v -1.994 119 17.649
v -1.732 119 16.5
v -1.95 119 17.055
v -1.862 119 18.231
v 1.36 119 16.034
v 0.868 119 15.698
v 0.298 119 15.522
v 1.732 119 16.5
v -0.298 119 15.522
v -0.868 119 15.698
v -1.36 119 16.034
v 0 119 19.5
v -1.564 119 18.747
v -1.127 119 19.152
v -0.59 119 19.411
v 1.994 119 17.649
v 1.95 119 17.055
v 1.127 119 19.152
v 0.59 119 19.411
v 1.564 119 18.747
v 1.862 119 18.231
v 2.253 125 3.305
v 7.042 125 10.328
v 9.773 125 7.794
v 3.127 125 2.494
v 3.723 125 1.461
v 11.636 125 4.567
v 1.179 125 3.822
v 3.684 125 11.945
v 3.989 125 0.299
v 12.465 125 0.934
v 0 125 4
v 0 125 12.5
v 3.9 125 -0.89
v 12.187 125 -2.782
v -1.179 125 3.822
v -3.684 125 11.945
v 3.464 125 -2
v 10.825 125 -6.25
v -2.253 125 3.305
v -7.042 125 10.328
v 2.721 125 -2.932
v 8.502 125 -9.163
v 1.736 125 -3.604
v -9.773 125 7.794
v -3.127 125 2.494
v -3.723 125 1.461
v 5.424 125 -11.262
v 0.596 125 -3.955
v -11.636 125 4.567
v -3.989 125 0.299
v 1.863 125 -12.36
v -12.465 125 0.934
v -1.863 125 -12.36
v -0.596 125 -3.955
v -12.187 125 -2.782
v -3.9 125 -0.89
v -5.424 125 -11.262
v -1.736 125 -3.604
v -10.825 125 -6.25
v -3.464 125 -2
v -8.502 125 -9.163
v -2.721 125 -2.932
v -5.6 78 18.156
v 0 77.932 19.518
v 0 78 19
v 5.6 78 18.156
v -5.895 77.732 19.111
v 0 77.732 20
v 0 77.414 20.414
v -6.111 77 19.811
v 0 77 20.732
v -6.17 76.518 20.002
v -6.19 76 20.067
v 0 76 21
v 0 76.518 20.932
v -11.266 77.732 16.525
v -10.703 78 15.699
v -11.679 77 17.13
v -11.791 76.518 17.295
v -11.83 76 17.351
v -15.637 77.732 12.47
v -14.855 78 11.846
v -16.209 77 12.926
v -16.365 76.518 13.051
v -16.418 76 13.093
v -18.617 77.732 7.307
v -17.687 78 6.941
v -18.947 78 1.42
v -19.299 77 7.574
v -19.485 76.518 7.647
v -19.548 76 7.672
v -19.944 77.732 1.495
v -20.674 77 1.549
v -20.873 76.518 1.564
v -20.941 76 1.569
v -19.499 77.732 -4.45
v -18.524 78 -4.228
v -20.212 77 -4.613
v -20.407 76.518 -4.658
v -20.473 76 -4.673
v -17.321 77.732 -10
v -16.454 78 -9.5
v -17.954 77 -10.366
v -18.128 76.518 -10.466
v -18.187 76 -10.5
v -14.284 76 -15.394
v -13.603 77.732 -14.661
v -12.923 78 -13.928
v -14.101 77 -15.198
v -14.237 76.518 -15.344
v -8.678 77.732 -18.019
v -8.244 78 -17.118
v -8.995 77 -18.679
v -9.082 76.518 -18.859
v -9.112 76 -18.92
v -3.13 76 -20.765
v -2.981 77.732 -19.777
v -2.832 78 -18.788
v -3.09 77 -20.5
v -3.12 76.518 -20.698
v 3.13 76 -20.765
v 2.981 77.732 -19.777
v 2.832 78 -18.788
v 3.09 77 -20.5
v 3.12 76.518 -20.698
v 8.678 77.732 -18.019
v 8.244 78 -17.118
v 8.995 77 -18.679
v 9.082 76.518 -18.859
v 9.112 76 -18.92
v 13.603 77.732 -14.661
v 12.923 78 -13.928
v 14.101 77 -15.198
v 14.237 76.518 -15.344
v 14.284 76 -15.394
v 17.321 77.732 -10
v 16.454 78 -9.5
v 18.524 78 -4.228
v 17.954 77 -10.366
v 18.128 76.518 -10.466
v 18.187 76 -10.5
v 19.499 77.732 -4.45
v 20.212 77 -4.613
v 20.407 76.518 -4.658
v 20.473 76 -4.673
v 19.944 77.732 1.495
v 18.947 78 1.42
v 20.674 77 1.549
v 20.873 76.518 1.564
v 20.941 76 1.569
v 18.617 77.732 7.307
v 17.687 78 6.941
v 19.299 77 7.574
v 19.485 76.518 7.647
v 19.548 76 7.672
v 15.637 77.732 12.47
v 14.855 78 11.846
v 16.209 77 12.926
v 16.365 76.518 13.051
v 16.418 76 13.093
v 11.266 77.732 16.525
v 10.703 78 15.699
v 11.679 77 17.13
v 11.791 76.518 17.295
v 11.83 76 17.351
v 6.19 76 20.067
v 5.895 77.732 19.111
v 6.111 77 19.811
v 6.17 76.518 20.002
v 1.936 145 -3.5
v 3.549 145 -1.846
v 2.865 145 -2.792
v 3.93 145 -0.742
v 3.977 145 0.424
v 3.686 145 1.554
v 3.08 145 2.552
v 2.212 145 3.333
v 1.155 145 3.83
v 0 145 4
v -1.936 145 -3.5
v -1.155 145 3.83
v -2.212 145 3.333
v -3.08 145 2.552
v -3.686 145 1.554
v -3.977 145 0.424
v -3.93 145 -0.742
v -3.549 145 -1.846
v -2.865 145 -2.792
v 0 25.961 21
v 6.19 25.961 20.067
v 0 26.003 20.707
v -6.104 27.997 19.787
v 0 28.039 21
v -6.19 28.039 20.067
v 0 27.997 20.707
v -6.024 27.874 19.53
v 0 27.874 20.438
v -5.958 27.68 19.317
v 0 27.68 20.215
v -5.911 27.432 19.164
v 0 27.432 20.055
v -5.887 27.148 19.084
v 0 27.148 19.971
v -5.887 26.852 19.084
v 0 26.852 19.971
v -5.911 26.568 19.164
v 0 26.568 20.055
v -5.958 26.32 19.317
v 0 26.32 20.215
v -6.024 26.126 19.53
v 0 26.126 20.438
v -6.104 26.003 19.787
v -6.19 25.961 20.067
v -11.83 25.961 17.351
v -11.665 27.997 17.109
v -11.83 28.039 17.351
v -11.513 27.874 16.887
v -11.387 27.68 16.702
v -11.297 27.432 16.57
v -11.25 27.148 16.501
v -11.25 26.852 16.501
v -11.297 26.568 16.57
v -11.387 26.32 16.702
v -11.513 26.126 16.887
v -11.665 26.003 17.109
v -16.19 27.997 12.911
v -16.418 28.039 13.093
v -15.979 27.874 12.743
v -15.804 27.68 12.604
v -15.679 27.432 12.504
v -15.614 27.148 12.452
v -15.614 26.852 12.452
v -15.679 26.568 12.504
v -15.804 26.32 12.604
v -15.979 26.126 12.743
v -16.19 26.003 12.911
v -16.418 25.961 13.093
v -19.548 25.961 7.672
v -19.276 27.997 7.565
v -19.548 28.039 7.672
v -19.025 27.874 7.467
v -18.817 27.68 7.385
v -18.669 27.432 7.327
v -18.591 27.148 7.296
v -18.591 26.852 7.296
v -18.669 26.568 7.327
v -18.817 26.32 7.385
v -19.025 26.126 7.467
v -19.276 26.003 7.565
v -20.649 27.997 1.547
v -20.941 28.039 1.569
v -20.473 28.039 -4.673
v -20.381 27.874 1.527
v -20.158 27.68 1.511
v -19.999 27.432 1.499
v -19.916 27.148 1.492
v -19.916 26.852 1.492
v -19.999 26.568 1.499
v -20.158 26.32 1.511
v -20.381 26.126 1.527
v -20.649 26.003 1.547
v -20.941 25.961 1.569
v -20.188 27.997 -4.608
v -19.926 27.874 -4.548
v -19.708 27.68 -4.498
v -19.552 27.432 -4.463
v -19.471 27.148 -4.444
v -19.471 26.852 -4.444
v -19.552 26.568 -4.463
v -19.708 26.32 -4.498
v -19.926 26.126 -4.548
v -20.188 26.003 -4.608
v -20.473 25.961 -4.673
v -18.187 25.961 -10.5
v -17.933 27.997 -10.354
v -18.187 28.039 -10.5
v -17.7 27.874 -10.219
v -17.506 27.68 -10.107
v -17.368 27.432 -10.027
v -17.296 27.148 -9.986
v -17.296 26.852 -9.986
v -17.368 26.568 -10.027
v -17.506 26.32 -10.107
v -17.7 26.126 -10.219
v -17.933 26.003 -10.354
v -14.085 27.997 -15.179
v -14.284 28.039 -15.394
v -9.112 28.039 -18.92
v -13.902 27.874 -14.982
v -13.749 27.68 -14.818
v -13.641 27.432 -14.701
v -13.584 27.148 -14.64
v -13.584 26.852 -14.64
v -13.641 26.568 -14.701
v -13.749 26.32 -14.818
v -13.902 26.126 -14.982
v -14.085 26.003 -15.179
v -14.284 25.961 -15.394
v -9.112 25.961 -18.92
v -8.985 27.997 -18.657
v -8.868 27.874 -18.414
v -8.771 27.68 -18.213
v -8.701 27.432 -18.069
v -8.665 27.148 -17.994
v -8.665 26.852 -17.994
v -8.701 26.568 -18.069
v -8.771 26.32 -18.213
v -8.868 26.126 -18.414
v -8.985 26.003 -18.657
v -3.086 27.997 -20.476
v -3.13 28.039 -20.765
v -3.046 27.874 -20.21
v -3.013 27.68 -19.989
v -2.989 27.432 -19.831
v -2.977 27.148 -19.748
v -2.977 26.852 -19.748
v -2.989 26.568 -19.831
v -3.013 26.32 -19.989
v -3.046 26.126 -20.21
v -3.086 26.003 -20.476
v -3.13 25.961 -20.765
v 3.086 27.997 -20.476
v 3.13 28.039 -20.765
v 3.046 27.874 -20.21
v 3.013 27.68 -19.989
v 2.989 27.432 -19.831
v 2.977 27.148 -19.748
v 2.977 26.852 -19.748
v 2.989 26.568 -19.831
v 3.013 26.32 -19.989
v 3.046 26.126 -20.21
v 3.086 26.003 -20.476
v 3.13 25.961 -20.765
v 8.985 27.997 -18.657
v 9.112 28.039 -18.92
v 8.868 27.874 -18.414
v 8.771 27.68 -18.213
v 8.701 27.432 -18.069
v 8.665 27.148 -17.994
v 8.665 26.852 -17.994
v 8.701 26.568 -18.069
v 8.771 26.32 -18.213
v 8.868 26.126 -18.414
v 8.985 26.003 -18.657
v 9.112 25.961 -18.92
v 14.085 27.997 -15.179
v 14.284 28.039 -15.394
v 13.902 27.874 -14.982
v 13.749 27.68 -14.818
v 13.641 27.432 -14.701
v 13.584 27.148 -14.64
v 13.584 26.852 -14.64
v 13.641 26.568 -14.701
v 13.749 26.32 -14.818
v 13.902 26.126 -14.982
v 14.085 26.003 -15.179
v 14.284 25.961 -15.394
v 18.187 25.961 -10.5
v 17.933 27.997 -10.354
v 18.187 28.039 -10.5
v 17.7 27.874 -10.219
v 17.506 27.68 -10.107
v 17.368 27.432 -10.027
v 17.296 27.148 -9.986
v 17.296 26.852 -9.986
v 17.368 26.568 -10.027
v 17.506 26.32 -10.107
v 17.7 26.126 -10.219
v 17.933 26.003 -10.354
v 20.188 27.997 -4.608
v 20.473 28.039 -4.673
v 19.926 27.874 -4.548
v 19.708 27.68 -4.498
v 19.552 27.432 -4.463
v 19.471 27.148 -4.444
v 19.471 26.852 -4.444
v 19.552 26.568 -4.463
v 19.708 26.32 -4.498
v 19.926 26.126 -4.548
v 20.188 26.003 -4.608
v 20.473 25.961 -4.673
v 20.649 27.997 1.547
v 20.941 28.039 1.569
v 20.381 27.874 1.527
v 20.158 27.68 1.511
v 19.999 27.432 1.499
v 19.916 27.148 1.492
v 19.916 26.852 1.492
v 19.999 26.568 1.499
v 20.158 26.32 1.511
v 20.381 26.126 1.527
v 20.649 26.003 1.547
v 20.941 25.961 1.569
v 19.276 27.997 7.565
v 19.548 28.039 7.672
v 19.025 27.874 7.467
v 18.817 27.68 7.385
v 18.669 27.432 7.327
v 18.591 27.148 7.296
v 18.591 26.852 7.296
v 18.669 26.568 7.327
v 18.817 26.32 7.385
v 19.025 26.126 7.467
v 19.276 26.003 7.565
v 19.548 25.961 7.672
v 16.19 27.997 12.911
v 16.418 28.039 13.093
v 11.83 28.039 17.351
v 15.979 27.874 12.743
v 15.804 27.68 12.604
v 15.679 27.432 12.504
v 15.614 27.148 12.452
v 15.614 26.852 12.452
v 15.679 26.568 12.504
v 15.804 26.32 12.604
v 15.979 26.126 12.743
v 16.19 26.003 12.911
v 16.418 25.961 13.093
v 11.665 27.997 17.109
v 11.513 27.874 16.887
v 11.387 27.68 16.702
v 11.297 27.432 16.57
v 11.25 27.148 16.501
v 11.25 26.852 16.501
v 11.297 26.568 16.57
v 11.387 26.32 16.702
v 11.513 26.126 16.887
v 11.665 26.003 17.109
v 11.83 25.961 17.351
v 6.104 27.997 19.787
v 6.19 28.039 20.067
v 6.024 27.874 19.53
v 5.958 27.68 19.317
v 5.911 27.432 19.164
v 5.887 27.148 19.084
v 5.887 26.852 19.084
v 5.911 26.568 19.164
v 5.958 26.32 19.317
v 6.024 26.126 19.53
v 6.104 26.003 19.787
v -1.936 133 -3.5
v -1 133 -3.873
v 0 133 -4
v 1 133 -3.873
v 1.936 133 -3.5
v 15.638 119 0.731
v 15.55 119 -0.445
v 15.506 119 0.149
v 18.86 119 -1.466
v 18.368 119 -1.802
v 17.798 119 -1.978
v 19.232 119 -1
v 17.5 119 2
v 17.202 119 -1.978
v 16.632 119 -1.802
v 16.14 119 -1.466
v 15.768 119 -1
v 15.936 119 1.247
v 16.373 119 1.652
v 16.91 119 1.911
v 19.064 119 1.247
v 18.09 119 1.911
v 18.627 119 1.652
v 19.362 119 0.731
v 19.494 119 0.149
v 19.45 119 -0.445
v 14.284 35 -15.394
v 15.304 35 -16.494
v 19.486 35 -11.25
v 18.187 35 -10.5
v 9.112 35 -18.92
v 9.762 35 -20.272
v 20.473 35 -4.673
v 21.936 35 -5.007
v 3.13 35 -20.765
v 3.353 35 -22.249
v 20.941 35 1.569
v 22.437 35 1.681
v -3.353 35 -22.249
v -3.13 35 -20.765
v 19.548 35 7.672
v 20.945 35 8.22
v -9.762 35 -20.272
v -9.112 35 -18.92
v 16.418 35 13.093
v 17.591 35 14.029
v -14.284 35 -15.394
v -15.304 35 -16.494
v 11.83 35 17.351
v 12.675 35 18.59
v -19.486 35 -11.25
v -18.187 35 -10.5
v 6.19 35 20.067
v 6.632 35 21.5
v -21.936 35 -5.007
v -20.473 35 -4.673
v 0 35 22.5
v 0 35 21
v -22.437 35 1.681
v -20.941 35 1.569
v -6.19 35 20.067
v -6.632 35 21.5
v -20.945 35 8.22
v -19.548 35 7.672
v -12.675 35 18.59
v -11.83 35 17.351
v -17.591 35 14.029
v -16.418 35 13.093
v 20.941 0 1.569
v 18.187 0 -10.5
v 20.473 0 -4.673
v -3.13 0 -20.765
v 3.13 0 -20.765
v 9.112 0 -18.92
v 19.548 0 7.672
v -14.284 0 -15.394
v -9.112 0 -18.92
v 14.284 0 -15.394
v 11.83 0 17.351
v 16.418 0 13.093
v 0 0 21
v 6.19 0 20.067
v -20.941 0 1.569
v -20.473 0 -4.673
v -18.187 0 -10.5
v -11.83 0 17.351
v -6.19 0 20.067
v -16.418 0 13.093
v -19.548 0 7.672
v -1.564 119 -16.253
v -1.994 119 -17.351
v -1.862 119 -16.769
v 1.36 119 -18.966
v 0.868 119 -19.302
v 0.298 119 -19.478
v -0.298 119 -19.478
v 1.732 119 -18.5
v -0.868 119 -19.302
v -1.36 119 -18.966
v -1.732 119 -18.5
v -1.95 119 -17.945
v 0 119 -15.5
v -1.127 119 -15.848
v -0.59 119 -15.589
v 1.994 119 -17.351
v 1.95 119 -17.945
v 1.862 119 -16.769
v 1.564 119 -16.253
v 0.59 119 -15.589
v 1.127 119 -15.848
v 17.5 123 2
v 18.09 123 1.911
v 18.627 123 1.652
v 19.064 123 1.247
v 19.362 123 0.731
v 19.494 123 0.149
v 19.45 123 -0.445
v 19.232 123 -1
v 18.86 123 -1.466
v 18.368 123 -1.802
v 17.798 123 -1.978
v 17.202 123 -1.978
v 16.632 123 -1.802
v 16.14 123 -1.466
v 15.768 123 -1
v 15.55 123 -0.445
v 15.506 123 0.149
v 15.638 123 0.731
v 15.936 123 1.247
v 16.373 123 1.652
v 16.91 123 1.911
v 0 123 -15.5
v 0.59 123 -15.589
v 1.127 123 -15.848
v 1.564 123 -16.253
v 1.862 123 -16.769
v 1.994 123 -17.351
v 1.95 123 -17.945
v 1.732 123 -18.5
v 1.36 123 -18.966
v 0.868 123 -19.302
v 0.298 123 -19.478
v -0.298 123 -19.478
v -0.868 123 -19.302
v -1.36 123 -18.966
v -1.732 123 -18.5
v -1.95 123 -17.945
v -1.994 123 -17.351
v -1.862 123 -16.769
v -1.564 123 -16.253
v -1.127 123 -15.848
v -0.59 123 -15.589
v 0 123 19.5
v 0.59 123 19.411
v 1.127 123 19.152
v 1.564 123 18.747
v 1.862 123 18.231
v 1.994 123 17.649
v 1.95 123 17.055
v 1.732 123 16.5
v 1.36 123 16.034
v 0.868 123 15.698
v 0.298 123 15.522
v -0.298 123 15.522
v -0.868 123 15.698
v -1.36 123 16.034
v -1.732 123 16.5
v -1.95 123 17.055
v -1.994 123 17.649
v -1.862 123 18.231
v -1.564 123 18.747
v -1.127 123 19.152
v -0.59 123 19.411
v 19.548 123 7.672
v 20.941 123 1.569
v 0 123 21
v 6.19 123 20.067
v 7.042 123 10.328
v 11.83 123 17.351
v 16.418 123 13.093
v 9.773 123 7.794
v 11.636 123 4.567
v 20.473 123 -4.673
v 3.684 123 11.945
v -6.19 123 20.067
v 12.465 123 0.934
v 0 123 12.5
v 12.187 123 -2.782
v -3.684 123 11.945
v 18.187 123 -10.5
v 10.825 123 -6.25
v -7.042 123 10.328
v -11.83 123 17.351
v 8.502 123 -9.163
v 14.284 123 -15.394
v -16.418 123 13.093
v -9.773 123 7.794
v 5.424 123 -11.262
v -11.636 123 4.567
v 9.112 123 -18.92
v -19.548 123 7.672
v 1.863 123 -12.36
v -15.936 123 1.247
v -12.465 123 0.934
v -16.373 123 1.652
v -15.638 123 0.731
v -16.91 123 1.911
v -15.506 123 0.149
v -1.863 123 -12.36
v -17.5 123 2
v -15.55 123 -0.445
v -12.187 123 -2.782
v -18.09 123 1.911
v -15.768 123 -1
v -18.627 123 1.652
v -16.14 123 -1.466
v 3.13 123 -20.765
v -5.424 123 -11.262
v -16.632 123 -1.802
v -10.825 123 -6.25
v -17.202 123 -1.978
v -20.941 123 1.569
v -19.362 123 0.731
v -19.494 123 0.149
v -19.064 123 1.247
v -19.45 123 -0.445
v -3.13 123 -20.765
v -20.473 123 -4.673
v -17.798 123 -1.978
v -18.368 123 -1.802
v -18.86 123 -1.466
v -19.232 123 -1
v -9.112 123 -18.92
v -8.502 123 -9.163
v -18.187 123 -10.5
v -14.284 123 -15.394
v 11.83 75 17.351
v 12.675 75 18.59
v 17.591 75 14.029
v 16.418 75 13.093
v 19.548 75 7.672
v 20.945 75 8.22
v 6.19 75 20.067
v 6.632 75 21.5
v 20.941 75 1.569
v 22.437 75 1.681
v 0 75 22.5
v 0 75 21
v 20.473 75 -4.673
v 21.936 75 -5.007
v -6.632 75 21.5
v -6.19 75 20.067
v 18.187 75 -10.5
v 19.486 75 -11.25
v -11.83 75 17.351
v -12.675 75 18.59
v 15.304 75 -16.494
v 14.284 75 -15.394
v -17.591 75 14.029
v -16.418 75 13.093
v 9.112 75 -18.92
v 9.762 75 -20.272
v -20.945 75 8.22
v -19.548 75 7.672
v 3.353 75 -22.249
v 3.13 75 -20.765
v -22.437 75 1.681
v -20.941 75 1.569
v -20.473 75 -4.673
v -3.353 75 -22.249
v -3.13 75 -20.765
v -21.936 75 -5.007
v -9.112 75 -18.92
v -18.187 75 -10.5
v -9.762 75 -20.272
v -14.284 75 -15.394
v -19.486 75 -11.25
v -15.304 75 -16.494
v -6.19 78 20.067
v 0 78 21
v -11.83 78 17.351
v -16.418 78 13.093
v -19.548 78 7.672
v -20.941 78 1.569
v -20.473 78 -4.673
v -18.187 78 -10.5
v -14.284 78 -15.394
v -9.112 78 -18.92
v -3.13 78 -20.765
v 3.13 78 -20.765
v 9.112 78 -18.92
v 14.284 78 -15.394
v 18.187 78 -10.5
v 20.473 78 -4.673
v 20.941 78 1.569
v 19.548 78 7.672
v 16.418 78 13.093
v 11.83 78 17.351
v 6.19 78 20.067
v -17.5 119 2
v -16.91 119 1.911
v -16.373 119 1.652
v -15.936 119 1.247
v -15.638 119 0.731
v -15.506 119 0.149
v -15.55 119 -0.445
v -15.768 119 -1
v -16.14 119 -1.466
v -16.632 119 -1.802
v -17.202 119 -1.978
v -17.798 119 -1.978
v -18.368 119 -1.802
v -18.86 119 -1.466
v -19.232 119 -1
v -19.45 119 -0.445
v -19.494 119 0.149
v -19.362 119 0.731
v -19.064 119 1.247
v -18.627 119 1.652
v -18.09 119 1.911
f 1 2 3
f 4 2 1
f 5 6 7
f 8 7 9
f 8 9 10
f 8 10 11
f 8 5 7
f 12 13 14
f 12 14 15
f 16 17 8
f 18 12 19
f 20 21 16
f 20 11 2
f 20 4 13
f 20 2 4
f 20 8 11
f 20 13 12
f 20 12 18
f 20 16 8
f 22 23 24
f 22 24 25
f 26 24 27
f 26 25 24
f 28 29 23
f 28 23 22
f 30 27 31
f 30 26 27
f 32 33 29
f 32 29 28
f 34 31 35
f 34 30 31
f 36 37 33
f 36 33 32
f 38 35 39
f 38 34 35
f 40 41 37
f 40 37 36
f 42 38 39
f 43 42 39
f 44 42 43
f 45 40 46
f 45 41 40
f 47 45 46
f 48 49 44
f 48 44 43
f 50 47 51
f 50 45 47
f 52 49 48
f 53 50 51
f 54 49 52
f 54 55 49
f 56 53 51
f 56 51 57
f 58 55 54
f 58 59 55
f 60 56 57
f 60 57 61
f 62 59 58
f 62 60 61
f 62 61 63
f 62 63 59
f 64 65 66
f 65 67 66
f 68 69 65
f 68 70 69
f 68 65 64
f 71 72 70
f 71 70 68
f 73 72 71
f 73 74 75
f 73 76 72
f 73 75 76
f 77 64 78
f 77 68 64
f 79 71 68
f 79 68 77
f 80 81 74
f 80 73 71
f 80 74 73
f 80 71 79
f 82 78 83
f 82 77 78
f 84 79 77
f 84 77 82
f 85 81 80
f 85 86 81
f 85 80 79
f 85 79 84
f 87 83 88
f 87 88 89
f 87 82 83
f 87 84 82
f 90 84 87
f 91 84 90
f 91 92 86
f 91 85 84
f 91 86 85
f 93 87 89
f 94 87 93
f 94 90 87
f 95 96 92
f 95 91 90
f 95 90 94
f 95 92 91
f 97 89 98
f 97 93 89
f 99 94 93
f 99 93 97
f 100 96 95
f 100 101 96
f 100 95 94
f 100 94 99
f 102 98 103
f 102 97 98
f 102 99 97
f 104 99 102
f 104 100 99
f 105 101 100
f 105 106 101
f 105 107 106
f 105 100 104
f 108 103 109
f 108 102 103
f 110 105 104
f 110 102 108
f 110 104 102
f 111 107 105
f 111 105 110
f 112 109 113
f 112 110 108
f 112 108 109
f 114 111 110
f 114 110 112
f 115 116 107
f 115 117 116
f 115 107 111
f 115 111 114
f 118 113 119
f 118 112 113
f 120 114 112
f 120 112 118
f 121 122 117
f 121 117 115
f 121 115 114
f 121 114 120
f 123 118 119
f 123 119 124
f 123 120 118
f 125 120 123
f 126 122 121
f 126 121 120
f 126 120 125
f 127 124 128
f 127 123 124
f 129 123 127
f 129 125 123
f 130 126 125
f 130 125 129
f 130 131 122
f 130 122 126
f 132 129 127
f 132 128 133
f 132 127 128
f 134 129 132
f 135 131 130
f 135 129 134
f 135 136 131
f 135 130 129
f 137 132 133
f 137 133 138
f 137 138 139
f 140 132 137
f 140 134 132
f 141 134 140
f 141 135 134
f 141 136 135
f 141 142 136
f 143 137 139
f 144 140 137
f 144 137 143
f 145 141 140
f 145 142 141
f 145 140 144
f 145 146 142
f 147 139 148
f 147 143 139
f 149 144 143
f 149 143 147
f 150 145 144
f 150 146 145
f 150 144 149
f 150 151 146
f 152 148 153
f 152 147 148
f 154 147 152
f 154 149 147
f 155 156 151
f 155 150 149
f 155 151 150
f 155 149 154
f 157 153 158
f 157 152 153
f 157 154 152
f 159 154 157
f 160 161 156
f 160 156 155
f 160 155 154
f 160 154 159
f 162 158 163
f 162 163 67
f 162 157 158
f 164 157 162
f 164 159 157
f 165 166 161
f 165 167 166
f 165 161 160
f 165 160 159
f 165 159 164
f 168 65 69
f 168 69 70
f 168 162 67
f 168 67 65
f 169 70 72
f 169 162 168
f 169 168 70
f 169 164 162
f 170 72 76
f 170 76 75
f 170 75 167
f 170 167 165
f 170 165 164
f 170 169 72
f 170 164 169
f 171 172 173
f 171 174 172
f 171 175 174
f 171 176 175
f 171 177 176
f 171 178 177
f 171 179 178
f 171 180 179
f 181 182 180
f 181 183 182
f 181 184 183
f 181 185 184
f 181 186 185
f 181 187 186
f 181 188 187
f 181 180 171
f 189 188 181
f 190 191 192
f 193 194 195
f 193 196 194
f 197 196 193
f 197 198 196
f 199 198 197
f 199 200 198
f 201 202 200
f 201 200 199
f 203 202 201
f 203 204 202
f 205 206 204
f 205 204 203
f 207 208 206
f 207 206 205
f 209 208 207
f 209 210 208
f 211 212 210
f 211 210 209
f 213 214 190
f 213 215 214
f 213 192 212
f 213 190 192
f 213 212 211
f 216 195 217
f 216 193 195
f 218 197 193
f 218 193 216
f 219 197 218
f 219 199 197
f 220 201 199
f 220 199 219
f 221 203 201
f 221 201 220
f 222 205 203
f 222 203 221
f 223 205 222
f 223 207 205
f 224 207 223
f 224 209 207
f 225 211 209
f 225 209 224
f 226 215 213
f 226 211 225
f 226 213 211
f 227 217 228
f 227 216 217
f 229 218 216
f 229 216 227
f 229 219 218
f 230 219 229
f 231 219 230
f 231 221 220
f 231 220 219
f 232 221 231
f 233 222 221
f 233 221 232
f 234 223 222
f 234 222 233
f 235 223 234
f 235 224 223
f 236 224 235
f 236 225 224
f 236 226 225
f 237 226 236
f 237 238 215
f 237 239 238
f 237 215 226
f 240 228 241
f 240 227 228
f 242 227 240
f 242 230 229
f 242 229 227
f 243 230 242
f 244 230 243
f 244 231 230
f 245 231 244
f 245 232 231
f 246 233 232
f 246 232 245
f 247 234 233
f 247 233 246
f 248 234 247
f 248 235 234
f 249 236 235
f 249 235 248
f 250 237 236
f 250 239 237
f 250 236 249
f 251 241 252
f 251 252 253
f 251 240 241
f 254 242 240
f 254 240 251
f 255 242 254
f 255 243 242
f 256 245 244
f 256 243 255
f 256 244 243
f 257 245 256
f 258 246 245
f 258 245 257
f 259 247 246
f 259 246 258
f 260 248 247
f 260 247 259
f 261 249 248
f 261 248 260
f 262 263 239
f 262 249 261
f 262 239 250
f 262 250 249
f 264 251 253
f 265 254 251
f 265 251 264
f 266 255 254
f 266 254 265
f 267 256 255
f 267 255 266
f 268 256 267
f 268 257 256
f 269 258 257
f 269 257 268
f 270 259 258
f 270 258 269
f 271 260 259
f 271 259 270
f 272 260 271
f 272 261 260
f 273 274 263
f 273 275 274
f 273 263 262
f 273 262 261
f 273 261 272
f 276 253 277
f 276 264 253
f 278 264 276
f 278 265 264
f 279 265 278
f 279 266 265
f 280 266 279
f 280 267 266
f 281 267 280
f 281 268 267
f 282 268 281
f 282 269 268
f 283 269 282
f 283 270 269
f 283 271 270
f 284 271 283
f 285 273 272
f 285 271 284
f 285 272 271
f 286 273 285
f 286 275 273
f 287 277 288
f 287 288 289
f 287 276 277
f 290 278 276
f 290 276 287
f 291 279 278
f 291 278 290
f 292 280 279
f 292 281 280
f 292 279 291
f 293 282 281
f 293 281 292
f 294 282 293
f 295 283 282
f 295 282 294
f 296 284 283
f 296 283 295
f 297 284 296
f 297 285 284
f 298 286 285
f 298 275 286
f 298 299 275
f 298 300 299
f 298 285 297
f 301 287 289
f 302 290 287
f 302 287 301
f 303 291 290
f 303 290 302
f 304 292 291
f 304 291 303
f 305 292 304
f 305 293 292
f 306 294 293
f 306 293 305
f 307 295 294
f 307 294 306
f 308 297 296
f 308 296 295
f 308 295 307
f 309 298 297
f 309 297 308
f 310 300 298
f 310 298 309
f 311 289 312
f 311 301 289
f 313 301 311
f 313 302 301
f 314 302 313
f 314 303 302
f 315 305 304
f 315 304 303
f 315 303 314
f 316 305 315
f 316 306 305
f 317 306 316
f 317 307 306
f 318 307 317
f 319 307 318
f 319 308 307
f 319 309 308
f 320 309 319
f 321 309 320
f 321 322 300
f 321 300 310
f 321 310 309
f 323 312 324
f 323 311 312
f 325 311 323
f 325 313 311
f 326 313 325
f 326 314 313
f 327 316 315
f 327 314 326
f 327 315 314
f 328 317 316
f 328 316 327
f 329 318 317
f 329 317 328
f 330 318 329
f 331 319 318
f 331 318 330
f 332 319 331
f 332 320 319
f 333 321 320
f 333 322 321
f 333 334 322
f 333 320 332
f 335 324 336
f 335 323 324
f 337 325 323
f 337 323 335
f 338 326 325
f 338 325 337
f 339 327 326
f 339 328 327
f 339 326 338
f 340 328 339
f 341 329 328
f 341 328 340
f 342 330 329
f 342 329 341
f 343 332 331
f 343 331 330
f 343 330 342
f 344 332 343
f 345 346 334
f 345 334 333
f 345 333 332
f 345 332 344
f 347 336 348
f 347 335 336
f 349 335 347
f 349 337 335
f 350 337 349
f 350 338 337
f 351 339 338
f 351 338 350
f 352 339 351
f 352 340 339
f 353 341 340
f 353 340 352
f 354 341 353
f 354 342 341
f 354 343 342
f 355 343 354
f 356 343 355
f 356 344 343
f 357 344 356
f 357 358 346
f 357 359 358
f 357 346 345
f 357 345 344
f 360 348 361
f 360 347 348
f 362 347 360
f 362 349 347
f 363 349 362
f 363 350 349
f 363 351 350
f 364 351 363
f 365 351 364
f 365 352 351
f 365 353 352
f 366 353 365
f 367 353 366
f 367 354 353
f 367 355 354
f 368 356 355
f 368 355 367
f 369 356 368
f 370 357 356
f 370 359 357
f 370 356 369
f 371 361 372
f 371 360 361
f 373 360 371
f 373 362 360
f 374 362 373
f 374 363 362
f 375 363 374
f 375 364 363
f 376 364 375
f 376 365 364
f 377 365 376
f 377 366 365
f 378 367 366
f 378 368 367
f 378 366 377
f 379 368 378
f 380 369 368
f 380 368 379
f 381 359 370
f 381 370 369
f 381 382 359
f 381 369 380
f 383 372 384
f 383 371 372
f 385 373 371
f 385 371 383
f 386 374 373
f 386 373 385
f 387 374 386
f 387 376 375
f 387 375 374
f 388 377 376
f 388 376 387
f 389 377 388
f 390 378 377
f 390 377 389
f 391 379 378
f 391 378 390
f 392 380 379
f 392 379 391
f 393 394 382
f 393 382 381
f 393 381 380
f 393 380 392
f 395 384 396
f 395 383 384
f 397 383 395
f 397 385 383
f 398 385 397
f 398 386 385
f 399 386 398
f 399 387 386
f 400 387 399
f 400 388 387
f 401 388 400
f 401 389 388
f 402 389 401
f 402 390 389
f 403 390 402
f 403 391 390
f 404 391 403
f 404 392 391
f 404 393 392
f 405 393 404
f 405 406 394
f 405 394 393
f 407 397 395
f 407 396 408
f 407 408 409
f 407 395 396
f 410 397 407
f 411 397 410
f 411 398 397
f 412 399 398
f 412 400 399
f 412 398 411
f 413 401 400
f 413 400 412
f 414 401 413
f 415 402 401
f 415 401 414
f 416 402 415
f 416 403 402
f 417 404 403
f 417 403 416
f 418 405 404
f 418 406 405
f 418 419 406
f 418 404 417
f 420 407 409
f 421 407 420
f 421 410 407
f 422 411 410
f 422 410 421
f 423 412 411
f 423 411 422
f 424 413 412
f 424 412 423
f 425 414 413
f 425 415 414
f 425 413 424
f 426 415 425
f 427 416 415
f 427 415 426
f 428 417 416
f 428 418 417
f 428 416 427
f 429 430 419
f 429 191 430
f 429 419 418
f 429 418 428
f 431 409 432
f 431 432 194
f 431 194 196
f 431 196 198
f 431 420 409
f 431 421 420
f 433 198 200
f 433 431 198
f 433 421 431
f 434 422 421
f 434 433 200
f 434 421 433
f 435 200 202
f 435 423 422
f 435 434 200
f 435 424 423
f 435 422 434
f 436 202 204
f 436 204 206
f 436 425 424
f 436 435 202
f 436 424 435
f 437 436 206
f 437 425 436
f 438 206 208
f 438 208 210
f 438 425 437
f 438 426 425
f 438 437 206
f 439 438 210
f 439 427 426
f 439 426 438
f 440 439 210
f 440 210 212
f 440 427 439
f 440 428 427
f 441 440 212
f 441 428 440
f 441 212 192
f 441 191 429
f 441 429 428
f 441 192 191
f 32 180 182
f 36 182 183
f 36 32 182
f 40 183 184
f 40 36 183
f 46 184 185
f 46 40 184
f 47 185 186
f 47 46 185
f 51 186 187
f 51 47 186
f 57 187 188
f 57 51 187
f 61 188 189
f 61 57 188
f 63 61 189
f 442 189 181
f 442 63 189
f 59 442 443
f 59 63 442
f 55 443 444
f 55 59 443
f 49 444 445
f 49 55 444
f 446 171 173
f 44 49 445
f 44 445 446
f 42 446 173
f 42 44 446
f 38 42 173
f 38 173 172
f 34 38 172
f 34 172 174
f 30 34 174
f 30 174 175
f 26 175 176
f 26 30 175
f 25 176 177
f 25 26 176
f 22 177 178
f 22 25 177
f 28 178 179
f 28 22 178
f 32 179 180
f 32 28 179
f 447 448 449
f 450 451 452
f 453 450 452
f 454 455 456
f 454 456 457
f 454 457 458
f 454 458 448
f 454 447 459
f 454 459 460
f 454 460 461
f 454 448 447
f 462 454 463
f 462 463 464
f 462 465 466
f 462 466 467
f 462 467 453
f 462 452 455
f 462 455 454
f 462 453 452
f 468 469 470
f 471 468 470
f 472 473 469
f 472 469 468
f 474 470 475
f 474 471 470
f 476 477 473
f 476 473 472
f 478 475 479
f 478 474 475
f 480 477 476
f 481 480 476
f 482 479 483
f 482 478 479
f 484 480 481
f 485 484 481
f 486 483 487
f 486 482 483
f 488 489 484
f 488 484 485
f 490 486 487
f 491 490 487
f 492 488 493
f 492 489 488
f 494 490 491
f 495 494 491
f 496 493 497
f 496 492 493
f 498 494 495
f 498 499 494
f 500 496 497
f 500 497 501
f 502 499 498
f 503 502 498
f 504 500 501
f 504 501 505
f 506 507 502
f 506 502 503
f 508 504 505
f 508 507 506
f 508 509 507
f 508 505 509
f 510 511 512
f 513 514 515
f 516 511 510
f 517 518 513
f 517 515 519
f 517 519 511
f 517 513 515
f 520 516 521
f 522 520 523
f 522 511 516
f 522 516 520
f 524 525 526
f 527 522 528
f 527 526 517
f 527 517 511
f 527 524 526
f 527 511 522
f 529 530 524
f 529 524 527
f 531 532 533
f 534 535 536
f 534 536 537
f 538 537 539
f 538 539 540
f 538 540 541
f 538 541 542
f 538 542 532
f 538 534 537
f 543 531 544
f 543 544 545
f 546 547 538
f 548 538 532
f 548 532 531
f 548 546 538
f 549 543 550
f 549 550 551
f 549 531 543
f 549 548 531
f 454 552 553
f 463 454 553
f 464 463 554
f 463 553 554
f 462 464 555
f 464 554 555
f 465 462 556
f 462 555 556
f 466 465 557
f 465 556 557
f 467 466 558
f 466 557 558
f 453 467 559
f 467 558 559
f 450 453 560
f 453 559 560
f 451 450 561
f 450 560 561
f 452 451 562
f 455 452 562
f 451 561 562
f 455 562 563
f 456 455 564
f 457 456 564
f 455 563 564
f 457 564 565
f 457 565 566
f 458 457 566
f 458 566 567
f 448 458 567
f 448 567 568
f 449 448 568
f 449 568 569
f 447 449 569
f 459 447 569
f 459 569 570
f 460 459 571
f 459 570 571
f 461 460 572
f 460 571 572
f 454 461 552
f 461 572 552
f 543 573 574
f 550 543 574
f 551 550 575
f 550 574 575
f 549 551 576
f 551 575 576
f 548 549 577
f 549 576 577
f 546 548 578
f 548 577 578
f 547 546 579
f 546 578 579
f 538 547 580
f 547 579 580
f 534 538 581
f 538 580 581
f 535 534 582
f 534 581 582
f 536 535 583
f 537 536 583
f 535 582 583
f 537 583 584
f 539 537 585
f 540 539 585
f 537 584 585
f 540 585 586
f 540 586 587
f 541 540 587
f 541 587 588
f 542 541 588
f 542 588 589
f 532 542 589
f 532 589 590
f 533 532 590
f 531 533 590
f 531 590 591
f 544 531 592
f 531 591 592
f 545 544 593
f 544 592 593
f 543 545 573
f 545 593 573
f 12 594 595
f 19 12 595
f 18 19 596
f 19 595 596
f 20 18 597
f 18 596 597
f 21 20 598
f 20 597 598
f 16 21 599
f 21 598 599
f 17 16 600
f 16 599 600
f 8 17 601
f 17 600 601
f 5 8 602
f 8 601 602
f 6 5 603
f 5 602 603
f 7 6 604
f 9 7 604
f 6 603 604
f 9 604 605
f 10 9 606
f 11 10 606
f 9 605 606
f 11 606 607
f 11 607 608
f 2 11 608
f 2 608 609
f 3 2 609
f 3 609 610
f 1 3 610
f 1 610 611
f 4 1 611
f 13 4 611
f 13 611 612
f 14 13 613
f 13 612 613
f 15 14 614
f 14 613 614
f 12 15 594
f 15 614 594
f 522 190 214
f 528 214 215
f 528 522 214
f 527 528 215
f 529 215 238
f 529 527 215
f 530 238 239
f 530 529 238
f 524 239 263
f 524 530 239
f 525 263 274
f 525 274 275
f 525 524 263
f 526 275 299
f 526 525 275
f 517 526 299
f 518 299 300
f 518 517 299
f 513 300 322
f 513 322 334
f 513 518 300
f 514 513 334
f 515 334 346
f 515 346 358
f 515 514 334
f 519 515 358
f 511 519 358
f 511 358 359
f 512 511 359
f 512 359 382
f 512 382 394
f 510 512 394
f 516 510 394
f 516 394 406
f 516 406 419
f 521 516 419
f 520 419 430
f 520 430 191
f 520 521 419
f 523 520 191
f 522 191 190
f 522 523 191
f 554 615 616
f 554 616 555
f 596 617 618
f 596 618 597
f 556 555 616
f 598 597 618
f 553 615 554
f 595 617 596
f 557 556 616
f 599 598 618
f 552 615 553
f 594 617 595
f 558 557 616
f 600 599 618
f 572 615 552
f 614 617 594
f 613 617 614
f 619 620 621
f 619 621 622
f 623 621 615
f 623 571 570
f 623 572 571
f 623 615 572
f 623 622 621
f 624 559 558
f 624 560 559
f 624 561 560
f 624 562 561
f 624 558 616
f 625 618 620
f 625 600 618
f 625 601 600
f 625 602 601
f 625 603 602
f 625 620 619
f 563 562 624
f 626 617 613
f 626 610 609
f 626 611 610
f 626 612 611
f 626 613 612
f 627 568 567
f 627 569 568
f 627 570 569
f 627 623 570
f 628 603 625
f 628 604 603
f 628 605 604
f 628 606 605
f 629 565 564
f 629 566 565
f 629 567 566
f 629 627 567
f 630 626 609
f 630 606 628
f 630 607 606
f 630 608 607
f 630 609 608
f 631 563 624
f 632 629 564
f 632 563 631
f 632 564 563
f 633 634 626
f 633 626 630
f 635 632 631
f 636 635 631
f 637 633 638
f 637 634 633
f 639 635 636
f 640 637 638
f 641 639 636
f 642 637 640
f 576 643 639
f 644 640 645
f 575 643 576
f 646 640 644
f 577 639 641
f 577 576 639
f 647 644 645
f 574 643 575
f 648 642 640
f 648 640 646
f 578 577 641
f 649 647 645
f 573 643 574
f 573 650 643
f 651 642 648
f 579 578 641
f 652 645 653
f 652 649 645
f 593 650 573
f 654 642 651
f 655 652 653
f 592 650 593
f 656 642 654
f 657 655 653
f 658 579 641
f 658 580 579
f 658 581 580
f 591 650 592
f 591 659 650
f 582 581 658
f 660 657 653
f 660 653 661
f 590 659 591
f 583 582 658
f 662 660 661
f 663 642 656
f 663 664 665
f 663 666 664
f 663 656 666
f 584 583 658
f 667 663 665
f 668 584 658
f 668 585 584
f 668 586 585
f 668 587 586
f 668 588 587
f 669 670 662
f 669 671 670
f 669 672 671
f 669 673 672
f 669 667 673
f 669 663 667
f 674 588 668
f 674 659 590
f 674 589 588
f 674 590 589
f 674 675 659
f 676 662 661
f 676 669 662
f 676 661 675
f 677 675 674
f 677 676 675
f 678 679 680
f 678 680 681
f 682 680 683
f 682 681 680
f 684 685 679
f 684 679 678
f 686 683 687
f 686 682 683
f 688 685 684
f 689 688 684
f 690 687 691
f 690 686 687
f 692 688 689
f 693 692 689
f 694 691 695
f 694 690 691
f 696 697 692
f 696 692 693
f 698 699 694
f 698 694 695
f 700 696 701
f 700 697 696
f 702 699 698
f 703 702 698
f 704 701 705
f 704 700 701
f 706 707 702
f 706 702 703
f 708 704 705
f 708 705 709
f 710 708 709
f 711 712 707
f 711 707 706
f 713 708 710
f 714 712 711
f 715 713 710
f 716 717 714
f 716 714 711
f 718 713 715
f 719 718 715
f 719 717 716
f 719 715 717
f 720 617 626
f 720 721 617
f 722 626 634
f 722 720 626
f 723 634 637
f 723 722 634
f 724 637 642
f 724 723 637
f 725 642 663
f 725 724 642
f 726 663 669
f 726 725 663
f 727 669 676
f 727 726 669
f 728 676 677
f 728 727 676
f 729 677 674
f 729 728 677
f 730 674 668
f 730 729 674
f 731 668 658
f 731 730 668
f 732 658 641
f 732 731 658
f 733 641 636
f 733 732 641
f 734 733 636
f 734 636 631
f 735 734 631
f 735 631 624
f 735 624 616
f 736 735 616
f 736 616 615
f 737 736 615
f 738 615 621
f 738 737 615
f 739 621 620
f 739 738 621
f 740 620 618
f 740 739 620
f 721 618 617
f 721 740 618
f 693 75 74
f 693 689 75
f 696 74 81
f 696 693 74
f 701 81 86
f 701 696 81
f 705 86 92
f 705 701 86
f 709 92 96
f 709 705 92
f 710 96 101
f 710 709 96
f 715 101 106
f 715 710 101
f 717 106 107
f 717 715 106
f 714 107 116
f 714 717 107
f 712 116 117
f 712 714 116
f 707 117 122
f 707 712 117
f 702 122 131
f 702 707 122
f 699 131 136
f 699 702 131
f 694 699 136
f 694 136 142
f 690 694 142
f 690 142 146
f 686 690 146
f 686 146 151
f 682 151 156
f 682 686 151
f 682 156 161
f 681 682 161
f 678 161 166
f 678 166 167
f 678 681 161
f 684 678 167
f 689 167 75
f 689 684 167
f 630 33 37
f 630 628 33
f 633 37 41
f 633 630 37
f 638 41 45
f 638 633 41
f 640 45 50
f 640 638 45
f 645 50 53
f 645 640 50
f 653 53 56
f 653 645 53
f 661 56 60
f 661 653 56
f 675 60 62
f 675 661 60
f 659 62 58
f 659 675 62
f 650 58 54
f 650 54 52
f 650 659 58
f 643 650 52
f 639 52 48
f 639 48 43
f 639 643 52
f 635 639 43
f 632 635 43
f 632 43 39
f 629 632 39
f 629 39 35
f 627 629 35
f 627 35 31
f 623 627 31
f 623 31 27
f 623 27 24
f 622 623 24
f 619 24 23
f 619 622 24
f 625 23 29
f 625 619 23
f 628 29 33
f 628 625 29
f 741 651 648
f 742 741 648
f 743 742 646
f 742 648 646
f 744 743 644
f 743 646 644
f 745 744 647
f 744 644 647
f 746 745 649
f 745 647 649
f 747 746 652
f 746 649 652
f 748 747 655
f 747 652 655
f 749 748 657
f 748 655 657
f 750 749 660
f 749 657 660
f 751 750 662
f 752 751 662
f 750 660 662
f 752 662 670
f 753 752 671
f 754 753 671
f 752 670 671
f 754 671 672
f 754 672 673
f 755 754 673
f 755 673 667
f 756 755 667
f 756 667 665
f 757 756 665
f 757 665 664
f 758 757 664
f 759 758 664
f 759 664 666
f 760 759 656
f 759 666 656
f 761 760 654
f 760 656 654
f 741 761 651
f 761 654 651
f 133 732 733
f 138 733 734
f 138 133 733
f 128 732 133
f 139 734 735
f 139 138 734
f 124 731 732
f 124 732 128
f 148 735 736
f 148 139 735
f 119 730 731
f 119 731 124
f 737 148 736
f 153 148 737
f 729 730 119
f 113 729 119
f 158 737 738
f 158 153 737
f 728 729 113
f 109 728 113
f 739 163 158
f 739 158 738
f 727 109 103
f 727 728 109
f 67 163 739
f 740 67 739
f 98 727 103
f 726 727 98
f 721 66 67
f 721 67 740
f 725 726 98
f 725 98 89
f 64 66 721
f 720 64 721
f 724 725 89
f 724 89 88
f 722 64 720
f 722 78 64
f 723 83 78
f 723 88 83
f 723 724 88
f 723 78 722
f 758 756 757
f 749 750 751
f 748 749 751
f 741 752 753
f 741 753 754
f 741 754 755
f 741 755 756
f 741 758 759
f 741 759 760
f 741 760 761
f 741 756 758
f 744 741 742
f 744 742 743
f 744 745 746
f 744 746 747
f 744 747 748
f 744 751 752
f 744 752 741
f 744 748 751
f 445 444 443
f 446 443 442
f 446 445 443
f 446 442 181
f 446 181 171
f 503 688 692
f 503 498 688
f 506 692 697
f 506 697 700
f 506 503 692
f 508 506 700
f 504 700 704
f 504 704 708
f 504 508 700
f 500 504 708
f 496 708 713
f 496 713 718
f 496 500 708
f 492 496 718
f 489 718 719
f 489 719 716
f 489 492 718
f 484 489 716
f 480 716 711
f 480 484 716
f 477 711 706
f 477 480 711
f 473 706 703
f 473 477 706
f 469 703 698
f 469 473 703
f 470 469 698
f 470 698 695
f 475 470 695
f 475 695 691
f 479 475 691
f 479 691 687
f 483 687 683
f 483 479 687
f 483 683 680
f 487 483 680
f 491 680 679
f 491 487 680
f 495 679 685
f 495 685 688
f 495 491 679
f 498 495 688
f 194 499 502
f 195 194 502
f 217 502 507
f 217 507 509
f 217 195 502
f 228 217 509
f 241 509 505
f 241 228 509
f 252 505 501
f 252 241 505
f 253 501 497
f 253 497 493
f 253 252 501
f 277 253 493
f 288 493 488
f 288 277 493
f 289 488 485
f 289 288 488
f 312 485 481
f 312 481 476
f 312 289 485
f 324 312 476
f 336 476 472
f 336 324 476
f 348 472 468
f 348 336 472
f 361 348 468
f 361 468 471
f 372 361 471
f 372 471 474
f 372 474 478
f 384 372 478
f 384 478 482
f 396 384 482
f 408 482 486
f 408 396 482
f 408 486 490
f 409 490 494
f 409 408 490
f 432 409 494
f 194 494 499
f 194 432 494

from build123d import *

# Parameters (mm, degrees)
CUT_EXTRUDE1_START = -12
CUT_EXTRUDE1_DEPTH = 12
SKETCH3_R          = 2
CUT_EXTRUDE2_DEPTH = 4


with BuildPart() as part:
    # Sketch1 → Revolve1 (revolve)
    with BuildSketch(Plane.XY, mode=Mode.PRIVATE) as revolve1_sk:
        with BuildLine():
            ThreePointArc((21, 28.039082801), (19.960917199, 27), (21, 25.960917199))
            Line((21, 25.960917199), (21, 0))
            Line((21, 0), (0, 0))
            Line((0, 0), (0, 145))
            Line((0, 145), (4, 145))
            Line((4, 145), (4, 125))
            Line((4, 125), (12.5, 125))
            Line((12.5, 125), (12.5, 123))
            Line((12.5, 123), (21, 123))
            Line((21, 123), (21, 78))
            Line((21, 78), (19, 78))
            ThreePointArc((19, 78), (20.414213562, 77.414213562), (21, 76))
            Line((21, 76), (21, 75))
            Line((21, 75), (22.5, 75))
            Line((22.5, 75), (22.5, 35))
            Line((22.5, 35), (21, 35))
            Line((21, 35), (21, 28.039082801))
        make_face()
    revolve(revolve1_sk.sketch.rotate(Axis((0, 180.020988846, 0), (0, -1, 0)), 90), axis=Axis((0, 180.020988846, 0), (0, -1, 0)))

    # Sketch2 → Cut-Extrude1 (cut)
    with BuildSketch(Plane(origin=(0, 145, 0), x_dir=(1, 0, 0), z_dir=(0, 1, 0)).offset(CUT_EXTRUDE1_START)):
        with BuildLine():
            Line((-1.936491673, 3.5), (1.936491673, 3.5))
            ThreePointArc((1.936491673, 3.5), (0, 4), (-1.936491673, 3.5))
        make_face()
    extrude(amount=CUT_EXTRUDE1_DEPTH, mode=Mode.SUBTRACT)

    # Sketch3 → Cut-Extrude2 (cut)
    with BuildSketch(Plane(origin=(0, 123, 0), x_dir=(1, 0, 0), z_dir=(0, 1, 0))):
        with Locations(Location((0, 17.5, 0), (0, 0, 270))):
            Circle(SKETCH3_R)
        with Locations(Location((17.5, 0, 0), (0, 0, 270))):
            Circle(SKETCH3_R)
        with Locations(Location((0, -17.5, 0), (0, 0, 270))):
            Circle(SKETCH3_R)
        with Locations(Location((-17.5, 0, 0), (0, 0, 270))):
            Circle(SKETCH3_R)
    extrude(amount=-CUT_EXTRUDE2_DEPTH, mode=Mode.SUBTRACT)


solid = part.part
